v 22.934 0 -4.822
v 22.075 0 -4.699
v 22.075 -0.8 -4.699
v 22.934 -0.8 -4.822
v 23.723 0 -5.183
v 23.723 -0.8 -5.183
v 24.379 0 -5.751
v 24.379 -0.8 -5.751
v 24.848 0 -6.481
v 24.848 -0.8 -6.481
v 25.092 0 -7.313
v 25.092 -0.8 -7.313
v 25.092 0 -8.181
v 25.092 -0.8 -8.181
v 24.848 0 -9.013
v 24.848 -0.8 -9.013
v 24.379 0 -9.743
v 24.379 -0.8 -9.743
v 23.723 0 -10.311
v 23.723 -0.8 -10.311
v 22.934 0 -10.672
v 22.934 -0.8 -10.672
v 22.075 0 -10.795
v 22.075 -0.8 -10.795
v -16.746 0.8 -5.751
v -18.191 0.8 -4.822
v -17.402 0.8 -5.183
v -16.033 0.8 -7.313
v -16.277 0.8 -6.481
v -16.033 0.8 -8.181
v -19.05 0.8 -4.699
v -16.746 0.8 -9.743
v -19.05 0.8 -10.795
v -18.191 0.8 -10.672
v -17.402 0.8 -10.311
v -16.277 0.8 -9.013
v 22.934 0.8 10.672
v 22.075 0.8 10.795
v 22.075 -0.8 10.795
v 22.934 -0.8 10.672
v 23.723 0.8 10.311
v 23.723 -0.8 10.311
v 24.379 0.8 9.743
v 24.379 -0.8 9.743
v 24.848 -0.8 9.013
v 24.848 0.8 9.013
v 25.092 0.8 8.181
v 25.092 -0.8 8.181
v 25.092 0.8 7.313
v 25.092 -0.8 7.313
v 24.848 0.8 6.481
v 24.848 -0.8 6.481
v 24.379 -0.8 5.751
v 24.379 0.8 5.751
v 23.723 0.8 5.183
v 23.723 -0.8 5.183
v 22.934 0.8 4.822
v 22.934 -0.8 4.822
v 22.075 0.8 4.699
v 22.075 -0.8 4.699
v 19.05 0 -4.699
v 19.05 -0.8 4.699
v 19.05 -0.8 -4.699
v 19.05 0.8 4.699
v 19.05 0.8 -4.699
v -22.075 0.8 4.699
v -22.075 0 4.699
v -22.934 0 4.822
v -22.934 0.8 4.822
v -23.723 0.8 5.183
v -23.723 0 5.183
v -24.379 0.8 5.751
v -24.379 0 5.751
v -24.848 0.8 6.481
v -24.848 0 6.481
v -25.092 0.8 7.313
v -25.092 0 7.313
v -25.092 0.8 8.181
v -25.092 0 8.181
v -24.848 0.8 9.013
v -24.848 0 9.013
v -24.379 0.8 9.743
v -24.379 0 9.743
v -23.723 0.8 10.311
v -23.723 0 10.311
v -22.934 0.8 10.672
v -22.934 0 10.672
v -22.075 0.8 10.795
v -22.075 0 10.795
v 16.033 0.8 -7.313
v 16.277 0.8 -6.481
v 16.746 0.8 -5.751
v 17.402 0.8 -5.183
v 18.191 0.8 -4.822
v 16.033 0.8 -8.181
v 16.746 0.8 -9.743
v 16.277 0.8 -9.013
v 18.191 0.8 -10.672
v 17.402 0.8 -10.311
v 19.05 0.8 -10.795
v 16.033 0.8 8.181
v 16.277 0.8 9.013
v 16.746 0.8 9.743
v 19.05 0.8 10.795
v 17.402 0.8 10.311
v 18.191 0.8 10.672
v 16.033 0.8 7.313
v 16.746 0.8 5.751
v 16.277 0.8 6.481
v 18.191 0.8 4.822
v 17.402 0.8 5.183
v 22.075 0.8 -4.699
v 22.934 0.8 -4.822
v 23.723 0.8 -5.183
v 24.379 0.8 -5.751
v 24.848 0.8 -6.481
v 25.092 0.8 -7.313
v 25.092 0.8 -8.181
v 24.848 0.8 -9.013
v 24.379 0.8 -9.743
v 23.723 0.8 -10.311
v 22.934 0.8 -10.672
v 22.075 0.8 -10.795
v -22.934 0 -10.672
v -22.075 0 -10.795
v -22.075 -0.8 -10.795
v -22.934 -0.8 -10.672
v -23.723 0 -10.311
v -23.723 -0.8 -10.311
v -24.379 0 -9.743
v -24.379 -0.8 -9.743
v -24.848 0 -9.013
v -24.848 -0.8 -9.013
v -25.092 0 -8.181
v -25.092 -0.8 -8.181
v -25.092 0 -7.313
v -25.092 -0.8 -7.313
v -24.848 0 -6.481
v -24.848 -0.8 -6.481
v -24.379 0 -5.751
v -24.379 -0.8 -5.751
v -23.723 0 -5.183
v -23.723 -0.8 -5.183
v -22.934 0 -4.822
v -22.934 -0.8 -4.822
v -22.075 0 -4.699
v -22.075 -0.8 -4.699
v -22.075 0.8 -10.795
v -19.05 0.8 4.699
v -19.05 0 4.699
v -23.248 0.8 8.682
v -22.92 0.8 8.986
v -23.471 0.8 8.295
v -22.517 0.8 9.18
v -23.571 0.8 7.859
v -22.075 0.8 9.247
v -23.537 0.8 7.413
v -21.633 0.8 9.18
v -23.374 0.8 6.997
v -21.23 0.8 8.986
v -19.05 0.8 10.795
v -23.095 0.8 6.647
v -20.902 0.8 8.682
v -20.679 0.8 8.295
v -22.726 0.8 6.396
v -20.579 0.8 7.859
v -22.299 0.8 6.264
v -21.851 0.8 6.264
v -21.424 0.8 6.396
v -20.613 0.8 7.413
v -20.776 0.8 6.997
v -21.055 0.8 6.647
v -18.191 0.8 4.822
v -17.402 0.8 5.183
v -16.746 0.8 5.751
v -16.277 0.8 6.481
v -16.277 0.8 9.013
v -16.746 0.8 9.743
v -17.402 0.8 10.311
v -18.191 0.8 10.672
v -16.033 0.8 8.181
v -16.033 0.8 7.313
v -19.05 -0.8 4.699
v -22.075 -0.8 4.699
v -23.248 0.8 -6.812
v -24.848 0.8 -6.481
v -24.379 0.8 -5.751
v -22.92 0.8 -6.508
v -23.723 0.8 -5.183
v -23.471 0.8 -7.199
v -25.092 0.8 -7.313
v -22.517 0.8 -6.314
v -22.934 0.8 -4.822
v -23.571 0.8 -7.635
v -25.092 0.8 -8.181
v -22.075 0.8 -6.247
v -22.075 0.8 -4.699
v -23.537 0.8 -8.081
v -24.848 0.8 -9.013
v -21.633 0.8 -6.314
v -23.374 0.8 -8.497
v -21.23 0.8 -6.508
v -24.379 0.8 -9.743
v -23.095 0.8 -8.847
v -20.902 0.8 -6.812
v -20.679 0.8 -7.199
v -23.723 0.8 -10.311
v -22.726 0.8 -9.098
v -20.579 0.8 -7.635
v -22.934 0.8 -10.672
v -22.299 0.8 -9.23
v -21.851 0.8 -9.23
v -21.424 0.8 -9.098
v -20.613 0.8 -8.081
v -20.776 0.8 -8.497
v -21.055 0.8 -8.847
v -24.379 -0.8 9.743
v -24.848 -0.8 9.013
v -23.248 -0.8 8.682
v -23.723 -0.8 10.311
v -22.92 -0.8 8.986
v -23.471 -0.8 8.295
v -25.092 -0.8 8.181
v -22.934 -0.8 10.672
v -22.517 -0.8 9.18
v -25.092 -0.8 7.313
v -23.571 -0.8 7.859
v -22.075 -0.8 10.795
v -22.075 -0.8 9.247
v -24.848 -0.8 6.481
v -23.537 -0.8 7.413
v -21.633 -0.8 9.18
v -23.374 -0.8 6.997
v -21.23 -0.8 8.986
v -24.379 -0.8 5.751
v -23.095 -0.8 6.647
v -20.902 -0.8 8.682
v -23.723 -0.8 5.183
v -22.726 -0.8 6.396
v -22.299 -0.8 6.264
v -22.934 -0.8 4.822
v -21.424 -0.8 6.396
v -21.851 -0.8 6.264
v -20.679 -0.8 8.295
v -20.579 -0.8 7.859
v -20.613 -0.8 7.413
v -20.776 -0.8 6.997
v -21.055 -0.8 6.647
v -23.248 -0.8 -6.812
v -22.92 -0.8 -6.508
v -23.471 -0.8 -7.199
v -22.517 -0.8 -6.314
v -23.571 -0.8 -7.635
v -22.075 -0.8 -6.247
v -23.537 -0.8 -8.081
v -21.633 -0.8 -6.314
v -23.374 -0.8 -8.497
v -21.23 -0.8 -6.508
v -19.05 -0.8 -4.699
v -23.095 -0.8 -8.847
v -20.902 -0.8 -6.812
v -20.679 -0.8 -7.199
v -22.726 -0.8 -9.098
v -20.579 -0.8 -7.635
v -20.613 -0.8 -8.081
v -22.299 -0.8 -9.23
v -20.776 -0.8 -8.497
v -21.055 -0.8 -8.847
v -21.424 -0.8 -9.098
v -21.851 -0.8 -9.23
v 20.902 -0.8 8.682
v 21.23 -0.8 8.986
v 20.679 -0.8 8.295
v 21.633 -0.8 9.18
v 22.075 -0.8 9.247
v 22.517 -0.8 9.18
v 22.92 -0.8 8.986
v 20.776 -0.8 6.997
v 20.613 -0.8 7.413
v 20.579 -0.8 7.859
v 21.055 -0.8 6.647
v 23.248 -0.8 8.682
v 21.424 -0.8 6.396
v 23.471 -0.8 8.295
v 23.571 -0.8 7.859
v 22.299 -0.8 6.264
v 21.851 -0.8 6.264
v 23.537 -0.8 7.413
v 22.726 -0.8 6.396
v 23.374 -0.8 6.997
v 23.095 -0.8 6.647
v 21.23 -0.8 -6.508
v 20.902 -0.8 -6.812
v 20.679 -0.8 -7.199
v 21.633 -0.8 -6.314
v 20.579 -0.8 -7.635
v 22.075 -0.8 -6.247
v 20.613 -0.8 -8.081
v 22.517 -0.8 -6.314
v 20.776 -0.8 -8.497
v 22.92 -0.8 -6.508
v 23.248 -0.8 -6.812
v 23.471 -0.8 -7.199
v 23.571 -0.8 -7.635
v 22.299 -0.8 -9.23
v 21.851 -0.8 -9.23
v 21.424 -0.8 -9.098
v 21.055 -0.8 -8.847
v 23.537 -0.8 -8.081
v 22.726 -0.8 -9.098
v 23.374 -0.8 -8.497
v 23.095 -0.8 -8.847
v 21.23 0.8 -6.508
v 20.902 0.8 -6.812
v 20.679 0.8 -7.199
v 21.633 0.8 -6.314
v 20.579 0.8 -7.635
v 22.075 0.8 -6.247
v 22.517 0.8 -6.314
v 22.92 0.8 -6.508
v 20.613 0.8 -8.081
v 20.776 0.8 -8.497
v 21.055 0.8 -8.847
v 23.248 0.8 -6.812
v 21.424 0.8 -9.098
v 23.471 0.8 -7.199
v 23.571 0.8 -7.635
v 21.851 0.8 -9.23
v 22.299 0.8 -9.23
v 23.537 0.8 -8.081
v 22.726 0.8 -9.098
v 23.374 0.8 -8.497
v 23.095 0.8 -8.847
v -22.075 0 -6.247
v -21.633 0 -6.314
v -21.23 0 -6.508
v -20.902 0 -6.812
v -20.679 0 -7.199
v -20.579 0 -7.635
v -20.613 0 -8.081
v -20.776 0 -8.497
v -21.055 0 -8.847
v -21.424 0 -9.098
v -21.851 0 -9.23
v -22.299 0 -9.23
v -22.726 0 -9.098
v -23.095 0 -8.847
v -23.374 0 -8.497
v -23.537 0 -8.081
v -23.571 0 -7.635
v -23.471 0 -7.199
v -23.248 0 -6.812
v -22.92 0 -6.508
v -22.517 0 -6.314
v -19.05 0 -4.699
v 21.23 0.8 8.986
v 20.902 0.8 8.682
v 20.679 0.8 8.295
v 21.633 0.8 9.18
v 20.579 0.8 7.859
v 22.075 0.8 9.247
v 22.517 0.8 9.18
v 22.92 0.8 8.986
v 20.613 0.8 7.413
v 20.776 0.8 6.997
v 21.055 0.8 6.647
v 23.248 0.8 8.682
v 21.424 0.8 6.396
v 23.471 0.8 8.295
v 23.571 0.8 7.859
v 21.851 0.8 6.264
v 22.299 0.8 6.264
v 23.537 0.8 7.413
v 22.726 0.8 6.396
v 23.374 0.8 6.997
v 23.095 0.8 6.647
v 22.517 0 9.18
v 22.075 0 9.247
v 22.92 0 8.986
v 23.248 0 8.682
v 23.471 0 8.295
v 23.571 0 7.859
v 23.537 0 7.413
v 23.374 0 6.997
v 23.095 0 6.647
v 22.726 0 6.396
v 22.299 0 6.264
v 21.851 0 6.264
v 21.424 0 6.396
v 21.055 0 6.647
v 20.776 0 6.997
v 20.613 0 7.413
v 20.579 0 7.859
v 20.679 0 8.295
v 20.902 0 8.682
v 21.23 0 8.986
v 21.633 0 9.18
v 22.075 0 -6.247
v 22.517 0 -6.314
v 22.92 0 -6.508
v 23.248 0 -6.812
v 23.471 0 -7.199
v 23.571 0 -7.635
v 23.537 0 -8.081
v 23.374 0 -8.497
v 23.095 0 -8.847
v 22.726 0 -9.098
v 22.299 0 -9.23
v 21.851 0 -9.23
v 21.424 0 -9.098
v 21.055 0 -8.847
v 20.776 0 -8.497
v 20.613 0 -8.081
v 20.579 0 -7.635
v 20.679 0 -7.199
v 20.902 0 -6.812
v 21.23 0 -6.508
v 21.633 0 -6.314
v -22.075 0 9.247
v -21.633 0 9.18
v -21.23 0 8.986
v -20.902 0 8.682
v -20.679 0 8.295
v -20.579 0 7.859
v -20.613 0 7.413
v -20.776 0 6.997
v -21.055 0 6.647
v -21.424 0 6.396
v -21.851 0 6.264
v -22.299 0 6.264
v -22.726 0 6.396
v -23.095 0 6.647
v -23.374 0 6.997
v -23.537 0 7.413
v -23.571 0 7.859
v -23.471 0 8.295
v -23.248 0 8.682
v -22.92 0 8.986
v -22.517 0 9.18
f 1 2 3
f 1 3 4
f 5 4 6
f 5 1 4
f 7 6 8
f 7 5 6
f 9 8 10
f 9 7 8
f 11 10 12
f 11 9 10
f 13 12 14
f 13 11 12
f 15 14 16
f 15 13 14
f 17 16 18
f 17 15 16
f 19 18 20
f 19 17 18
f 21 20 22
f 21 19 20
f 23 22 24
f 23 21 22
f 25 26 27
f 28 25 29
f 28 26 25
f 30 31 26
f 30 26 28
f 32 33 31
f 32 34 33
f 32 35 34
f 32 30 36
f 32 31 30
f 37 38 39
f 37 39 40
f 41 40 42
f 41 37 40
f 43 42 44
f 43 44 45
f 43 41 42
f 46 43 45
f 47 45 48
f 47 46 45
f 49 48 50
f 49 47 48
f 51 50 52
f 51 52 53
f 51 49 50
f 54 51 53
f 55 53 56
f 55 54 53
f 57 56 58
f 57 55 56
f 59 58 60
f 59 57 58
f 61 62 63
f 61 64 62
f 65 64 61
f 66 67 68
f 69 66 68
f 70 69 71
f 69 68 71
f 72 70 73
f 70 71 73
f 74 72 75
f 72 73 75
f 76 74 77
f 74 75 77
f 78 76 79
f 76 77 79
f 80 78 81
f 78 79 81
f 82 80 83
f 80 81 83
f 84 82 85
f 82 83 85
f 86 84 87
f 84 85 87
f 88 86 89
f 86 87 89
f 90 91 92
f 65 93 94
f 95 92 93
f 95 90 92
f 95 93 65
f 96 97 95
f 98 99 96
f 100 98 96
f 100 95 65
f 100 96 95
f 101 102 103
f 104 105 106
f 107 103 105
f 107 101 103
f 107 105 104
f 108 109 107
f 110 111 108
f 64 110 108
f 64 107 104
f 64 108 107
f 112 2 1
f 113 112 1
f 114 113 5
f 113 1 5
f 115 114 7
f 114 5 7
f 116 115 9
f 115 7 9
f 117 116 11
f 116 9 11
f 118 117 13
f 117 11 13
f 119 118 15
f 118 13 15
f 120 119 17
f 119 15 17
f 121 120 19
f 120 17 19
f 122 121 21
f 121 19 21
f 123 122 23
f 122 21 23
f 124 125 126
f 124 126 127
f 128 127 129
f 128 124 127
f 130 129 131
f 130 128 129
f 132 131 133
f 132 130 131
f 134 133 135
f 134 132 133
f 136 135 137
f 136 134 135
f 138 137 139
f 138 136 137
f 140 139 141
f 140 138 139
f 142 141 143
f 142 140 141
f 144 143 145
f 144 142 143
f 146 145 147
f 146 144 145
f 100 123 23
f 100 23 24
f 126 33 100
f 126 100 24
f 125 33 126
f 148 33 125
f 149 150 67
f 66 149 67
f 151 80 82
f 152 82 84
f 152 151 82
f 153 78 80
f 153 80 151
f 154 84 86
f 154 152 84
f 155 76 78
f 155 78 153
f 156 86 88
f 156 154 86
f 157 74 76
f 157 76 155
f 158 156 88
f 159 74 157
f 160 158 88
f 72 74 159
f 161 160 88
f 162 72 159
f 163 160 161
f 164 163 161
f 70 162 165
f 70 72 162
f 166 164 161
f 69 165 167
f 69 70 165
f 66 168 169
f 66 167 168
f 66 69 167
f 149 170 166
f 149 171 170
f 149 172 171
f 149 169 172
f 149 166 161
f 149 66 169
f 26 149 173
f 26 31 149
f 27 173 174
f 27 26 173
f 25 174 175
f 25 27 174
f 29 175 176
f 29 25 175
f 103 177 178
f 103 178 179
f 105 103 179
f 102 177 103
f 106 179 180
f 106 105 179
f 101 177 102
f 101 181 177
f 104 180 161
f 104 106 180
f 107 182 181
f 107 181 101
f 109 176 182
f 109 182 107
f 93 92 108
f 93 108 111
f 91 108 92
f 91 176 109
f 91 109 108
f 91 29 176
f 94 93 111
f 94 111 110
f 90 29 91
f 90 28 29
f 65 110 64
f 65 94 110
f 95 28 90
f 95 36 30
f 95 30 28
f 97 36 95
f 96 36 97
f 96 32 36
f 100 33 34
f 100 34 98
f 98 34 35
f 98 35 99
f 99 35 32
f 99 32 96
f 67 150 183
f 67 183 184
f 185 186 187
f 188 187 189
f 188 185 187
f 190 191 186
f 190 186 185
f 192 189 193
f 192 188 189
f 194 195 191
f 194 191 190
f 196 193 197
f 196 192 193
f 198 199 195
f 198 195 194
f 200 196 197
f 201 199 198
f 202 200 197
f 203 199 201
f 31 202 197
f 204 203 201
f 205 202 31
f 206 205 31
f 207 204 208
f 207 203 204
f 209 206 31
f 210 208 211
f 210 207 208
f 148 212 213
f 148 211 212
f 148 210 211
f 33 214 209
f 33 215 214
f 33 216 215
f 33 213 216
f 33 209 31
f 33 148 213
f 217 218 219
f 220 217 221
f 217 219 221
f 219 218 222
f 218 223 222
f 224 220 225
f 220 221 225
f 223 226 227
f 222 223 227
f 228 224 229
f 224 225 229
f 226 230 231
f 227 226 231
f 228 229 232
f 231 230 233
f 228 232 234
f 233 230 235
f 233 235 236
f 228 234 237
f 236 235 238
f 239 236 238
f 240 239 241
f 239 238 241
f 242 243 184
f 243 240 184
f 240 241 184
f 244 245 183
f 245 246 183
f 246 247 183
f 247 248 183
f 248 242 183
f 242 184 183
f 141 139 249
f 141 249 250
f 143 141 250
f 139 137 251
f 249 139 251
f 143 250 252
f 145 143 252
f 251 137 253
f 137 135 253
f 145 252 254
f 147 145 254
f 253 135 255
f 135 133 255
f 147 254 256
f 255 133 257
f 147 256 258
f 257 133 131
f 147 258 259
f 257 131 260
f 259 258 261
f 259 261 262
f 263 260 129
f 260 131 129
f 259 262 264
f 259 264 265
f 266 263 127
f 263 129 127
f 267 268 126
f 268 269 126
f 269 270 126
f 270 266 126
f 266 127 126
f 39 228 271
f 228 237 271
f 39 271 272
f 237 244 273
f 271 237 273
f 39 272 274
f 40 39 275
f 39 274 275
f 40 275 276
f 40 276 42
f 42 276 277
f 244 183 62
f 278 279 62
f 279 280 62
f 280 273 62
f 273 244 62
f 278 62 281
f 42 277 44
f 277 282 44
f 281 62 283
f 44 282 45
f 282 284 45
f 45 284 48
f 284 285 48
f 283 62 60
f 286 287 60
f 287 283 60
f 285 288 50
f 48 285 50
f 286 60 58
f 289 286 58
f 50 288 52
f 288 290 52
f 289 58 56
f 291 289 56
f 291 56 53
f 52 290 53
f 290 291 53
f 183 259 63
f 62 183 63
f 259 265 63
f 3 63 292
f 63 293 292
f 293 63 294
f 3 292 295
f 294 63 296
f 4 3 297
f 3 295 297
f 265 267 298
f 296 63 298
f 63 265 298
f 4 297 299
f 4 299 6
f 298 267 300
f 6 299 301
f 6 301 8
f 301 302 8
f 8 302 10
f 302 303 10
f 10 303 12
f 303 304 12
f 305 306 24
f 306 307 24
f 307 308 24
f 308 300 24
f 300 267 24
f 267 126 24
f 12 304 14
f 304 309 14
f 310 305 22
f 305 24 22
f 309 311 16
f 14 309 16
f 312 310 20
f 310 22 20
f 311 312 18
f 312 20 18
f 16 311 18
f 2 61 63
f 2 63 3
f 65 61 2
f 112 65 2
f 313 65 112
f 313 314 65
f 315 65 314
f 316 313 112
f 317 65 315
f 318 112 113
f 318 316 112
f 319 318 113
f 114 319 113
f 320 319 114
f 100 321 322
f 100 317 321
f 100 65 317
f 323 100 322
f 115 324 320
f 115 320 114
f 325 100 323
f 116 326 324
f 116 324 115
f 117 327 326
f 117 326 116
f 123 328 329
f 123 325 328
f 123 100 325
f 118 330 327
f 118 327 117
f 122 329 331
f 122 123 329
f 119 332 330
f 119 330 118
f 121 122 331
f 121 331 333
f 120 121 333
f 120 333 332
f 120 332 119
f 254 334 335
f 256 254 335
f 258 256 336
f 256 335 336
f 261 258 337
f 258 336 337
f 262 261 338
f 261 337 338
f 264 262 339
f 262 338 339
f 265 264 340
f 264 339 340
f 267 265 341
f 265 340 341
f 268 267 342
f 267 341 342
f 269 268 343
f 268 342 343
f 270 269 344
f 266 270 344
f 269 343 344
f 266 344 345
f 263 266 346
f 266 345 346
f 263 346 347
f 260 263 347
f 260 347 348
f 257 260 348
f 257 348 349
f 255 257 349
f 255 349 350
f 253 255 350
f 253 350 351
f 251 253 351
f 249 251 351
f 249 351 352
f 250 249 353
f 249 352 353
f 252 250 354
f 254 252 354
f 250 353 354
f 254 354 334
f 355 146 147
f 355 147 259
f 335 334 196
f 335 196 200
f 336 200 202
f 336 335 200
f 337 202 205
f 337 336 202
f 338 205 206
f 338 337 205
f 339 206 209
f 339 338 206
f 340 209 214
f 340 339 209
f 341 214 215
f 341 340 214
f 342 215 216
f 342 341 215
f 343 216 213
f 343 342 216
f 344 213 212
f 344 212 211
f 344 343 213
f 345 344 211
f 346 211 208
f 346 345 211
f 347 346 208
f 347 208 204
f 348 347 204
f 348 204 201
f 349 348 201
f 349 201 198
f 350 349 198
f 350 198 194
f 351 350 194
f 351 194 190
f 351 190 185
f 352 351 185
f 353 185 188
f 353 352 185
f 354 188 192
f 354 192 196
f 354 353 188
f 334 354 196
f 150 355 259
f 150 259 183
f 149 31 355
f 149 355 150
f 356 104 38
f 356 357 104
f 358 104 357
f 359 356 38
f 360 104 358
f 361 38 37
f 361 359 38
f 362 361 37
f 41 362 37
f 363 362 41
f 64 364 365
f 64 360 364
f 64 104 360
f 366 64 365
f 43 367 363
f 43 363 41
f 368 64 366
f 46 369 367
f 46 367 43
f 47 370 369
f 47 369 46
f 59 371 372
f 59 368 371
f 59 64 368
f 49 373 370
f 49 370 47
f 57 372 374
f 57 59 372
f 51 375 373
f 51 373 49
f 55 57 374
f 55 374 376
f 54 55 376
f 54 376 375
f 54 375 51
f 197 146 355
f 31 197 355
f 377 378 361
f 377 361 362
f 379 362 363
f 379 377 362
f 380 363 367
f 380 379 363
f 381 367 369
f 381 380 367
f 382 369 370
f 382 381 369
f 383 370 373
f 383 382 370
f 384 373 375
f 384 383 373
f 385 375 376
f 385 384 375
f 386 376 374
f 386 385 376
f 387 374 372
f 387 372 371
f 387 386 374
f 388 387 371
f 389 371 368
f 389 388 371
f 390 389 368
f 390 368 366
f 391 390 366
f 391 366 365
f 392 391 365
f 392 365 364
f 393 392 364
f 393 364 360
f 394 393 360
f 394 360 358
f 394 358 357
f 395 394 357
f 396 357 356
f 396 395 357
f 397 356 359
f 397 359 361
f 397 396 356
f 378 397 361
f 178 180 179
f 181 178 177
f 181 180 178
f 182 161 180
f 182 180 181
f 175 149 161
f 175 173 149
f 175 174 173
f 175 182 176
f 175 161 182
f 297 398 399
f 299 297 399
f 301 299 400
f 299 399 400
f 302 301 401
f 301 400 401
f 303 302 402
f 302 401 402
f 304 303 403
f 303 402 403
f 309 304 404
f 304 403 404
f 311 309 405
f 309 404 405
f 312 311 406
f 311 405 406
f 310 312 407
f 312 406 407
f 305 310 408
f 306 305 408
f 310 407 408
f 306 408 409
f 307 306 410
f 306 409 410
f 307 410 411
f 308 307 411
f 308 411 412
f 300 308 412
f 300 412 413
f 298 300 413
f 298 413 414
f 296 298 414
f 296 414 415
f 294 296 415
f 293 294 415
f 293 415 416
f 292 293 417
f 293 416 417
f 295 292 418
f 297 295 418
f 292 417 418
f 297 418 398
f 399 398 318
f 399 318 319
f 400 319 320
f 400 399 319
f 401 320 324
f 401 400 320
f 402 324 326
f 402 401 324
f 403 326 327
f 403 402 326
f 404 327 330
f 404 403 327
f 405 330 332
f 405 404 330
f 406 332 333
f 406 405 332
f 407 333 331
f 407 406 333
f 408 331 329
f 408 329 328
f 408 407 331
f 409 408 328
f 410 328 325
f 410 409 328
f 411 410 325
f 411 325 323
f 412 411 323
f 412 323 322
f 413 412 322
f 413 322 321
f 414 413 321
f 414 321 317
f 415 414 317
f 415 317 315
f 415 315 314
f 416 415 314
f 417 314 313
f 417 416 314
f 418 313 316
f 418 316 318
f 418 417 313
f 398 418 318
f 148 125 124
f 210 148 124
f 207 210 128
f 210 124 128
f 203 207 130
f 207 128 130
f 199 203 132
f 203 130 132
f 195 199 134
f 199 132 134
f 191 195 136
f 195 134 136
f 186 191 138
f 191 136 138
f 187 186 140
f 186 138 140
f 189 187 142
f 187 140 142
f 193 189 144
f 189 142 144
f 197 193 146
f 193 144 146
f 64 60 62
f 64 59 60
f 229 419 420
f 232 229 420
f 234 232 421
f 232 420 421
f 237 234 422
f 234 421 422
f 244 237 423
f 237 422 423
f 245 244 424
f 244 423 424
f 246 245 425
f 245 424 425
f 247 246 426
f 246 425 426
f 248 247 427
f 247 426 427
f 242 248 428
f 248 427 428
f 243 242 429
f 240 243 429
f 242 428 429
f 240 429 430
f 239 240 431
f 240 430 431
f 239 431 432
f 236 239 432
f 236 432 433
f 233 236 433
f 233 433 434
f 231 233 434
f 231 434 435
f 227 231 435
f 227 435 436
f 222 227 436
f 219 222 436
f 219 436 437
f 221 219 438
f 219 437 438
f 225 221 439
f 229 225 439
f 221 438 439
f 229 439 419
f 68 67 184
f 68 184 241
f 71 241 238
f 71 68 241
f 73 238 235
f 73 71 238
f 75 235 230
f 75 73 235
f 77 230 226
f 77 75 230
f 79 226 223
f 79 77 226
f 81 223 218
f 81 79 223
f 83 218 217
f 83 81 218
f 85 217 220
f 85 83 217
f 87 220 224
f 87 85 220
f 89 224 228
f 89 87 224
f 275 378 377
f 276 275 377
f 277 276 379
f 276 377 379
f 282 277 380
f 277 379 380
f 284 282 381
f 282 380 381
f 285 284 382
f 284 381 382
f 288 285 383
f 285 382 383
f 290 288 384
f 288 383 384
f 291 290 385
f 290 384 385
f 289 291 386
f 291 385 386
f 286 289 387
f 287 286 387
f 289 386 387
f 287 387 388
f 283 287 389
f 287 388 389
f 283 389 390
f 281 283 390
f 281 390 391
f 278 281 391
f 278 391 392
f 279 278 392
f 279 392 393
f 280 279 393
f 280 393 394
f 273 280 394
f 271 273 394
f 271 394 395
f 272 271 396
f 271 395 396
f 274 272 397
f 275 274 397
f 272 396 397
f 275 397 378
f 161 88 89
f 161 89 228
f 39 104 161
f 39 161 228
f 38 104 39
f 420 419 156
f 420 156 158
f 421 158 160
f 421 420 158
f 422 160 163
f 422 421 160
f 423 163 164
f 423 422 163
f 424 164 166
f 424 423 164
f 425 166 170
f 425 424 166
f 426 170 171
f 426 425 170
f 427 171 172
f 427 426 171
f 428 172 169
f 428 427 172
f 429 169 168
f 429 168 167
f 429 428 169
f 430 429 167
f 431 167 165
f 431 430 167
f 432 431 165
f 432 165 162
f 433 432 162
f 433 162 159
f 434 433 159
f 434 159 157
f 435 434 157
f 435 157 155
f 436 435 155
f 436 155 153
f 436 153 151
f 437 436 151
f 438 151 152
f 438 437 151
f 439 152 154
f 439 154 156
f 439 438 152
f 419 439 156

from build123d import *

# Parameters (mm, degrees)
SKETCH1_R           = 1.5
BOSS_EXTRUDE1_DEPTH = 0.8


with BuildPart() as part:
    # Sketch1 → Boss-Extrude1 (new, symmetric)
    # profile 1 of 9: a face of its own
    with BuildSketch(Plane(origin=(0, 0, 0), x_dir=(1, 0, 0), z_dir=(0, 1, 0))):
        with BuildLine():
            ThreePointArc((-19.05, -4.699), (-16.002, -7.747), (-19.05, -10.795))
            Line((-19.05, -10.795), (19.05, -10.795))
            ThreePointArc((19.05, -10.795), (16.002, -7.747), (19.05, -4.699))
            Line((19.05, -4.699), (19.05, 4.699))
            ThreePointArc((19.05, 4.699), (16.002, 7.747), (19.05, 10.795))
            Line((19.05, 10.795), (-19.05, 10.795))
            ThreePointArc((-19.05, 10.795), (-16.002, 7.747), (-19.05, 4.699))
            Line((-19.05, 4.699), (-19.05, -4.699))
        make_face()
    # profile 2 of 9: a face of its own
    with BuildSketch(Plane(origin=(0, 0, 0), x_dir=(1, 0, 0), z_dir=(0, 1, 0))):
        with BuildLine():
            Line((-22.075, -10.795), (-19.05, -10.795))
            Line((-19.05, -10.795), (-19.05, -4.699))
            Line((-19.05, -4.699), (-22.075, -4.699))
            ThreePointArc((-22.075, -4.699), (-25.123, -7.747), (-22.075, -10.795))
        make_face()
        with Locations(Location((-22.075, -7.747, 0), (0, 0, 270))):
            Circle(SKETCH1_R, mode=Mode.SUBTRACT)
    # profile 3 of 9: a face of its own
    with BuildSketch(Plane(origin=(0, 0, 0), x_dir=(1, 0, 0), z_dir=(0, 1, 0))):
        with BuildLine():
            Line((-19.05, -4.699), (-19.05, -10.795))
            ThreePointArc((-19.05, -10.795), (-16.002, -7.747), (-19.05, -4.699))
        make_face()
    # profile 4 of 9: a face of its own
    with BuildSketch(Plane(origin=(0, 0, 0), x_dir=(1, 0, 0), z_dir=(0, 1, 0))):
        with BuildLine():
            Line((-19.05, 10.795), (-19.05, 4.699))
            ThreePointArc((-19.05, 4.699), (-16.002, 7.747), (-19.05, 10.795))
        make_face()
    # profile 5 of 9: a face of its own
    with BuildSketch(Plane(origin=(0, 0, 0), x_dir=(1, 0, 0), z_dir=(0, 1, 0))):
        with BuildLine():
            Line((-22.075, 4.699), (-19.05, 4.699))
            Line((-19.05, 4.699), (-19.05, 10.795))
            Line((-19.05, 10.795), (-22.075, 10.795))
            ThreePointArc((-22.075, 10.795), (-25.123, 7.747), (-22.075, 4.699))
        make_face()
        with Locations(Location((-22.075, 7.747, 0), (0, 0, 270))):
            Circle(SKETCH1_R, mode=Mode.SUBTRACT)
    # profile 6 of 9: a face of its own
    with BuildSketch(Plane(origin=(0, 0, 0), x_dir=(1, 0, 0), z_dir=(0, 1, 0))):
        with BuildLine():
            ThreePointArc((19.05, 10.795), (16.002, 7.747), (19.05, 4.699))
            Line((19.05, 4.699), (19.05, 10.795))
        make_face()
    # profile 7 of 9: a face of its own
    with BuildSketch(Plane(origin=(0, 0, 0), x_dir=(1, 0, 0), z_dir=(0, 1, 0))):
        with BuildLine():
            Line((19.05, 10.795), (19.05, 4.699))
            Line((19.05, 4.699), (22.075, 4.699))
            ThreePointArc((22.075, 4.699), (25.123, 7.747), (22.075, 10.795))
            Line((22.075, 10.795), (19.05, 10.795))
        make_face()
        with Locations(Location((22.075, 7.747, 0), (0, 0, 270))):
            Circle(SKETCH1_R, mode=Mode.SUBTRACT)
    # profile 8 of 9: a face of its own
    with BuildSketch(Plane(origin=(0, 0, 0), x_dir=(1, 0, 0), z_dir=(0, 1, 0))):
        with BuildLine():
            Line((19.05, -4.699), (19.05, -10.795))
            Line((19.05, -10.795), (22.075, -10.795))
            ThreePointArc((22.075, -10.795), (25.123, -7.747), (22.075, -4.699))
            Line((22.075, -4.699), (19.05, -4.699))
        make_face()
        with Locations(Location((22.075, -7.747, 0), (0, 0, 270))):
            Circle(SKETCH1_R, mode=Mode.SUBTRACT)
    # profile 9 of 9: a face of its own
    with BuildSketch(Plane(origin=(0, 0, 0), x_dir=(1, 0, 0), z_dir=(0, 1, 0))):
        with BuildLine():
            ThreePointArc((19.05, -4.699), (16.002, -7.747), (19.05, -10.795))
            Line((19.05, -10.795), (19.05, -4.699))
        make_face()
    extrude(amount=BOSS_EXTRUDE1_DEPTH, both=True)


solid = part.part
